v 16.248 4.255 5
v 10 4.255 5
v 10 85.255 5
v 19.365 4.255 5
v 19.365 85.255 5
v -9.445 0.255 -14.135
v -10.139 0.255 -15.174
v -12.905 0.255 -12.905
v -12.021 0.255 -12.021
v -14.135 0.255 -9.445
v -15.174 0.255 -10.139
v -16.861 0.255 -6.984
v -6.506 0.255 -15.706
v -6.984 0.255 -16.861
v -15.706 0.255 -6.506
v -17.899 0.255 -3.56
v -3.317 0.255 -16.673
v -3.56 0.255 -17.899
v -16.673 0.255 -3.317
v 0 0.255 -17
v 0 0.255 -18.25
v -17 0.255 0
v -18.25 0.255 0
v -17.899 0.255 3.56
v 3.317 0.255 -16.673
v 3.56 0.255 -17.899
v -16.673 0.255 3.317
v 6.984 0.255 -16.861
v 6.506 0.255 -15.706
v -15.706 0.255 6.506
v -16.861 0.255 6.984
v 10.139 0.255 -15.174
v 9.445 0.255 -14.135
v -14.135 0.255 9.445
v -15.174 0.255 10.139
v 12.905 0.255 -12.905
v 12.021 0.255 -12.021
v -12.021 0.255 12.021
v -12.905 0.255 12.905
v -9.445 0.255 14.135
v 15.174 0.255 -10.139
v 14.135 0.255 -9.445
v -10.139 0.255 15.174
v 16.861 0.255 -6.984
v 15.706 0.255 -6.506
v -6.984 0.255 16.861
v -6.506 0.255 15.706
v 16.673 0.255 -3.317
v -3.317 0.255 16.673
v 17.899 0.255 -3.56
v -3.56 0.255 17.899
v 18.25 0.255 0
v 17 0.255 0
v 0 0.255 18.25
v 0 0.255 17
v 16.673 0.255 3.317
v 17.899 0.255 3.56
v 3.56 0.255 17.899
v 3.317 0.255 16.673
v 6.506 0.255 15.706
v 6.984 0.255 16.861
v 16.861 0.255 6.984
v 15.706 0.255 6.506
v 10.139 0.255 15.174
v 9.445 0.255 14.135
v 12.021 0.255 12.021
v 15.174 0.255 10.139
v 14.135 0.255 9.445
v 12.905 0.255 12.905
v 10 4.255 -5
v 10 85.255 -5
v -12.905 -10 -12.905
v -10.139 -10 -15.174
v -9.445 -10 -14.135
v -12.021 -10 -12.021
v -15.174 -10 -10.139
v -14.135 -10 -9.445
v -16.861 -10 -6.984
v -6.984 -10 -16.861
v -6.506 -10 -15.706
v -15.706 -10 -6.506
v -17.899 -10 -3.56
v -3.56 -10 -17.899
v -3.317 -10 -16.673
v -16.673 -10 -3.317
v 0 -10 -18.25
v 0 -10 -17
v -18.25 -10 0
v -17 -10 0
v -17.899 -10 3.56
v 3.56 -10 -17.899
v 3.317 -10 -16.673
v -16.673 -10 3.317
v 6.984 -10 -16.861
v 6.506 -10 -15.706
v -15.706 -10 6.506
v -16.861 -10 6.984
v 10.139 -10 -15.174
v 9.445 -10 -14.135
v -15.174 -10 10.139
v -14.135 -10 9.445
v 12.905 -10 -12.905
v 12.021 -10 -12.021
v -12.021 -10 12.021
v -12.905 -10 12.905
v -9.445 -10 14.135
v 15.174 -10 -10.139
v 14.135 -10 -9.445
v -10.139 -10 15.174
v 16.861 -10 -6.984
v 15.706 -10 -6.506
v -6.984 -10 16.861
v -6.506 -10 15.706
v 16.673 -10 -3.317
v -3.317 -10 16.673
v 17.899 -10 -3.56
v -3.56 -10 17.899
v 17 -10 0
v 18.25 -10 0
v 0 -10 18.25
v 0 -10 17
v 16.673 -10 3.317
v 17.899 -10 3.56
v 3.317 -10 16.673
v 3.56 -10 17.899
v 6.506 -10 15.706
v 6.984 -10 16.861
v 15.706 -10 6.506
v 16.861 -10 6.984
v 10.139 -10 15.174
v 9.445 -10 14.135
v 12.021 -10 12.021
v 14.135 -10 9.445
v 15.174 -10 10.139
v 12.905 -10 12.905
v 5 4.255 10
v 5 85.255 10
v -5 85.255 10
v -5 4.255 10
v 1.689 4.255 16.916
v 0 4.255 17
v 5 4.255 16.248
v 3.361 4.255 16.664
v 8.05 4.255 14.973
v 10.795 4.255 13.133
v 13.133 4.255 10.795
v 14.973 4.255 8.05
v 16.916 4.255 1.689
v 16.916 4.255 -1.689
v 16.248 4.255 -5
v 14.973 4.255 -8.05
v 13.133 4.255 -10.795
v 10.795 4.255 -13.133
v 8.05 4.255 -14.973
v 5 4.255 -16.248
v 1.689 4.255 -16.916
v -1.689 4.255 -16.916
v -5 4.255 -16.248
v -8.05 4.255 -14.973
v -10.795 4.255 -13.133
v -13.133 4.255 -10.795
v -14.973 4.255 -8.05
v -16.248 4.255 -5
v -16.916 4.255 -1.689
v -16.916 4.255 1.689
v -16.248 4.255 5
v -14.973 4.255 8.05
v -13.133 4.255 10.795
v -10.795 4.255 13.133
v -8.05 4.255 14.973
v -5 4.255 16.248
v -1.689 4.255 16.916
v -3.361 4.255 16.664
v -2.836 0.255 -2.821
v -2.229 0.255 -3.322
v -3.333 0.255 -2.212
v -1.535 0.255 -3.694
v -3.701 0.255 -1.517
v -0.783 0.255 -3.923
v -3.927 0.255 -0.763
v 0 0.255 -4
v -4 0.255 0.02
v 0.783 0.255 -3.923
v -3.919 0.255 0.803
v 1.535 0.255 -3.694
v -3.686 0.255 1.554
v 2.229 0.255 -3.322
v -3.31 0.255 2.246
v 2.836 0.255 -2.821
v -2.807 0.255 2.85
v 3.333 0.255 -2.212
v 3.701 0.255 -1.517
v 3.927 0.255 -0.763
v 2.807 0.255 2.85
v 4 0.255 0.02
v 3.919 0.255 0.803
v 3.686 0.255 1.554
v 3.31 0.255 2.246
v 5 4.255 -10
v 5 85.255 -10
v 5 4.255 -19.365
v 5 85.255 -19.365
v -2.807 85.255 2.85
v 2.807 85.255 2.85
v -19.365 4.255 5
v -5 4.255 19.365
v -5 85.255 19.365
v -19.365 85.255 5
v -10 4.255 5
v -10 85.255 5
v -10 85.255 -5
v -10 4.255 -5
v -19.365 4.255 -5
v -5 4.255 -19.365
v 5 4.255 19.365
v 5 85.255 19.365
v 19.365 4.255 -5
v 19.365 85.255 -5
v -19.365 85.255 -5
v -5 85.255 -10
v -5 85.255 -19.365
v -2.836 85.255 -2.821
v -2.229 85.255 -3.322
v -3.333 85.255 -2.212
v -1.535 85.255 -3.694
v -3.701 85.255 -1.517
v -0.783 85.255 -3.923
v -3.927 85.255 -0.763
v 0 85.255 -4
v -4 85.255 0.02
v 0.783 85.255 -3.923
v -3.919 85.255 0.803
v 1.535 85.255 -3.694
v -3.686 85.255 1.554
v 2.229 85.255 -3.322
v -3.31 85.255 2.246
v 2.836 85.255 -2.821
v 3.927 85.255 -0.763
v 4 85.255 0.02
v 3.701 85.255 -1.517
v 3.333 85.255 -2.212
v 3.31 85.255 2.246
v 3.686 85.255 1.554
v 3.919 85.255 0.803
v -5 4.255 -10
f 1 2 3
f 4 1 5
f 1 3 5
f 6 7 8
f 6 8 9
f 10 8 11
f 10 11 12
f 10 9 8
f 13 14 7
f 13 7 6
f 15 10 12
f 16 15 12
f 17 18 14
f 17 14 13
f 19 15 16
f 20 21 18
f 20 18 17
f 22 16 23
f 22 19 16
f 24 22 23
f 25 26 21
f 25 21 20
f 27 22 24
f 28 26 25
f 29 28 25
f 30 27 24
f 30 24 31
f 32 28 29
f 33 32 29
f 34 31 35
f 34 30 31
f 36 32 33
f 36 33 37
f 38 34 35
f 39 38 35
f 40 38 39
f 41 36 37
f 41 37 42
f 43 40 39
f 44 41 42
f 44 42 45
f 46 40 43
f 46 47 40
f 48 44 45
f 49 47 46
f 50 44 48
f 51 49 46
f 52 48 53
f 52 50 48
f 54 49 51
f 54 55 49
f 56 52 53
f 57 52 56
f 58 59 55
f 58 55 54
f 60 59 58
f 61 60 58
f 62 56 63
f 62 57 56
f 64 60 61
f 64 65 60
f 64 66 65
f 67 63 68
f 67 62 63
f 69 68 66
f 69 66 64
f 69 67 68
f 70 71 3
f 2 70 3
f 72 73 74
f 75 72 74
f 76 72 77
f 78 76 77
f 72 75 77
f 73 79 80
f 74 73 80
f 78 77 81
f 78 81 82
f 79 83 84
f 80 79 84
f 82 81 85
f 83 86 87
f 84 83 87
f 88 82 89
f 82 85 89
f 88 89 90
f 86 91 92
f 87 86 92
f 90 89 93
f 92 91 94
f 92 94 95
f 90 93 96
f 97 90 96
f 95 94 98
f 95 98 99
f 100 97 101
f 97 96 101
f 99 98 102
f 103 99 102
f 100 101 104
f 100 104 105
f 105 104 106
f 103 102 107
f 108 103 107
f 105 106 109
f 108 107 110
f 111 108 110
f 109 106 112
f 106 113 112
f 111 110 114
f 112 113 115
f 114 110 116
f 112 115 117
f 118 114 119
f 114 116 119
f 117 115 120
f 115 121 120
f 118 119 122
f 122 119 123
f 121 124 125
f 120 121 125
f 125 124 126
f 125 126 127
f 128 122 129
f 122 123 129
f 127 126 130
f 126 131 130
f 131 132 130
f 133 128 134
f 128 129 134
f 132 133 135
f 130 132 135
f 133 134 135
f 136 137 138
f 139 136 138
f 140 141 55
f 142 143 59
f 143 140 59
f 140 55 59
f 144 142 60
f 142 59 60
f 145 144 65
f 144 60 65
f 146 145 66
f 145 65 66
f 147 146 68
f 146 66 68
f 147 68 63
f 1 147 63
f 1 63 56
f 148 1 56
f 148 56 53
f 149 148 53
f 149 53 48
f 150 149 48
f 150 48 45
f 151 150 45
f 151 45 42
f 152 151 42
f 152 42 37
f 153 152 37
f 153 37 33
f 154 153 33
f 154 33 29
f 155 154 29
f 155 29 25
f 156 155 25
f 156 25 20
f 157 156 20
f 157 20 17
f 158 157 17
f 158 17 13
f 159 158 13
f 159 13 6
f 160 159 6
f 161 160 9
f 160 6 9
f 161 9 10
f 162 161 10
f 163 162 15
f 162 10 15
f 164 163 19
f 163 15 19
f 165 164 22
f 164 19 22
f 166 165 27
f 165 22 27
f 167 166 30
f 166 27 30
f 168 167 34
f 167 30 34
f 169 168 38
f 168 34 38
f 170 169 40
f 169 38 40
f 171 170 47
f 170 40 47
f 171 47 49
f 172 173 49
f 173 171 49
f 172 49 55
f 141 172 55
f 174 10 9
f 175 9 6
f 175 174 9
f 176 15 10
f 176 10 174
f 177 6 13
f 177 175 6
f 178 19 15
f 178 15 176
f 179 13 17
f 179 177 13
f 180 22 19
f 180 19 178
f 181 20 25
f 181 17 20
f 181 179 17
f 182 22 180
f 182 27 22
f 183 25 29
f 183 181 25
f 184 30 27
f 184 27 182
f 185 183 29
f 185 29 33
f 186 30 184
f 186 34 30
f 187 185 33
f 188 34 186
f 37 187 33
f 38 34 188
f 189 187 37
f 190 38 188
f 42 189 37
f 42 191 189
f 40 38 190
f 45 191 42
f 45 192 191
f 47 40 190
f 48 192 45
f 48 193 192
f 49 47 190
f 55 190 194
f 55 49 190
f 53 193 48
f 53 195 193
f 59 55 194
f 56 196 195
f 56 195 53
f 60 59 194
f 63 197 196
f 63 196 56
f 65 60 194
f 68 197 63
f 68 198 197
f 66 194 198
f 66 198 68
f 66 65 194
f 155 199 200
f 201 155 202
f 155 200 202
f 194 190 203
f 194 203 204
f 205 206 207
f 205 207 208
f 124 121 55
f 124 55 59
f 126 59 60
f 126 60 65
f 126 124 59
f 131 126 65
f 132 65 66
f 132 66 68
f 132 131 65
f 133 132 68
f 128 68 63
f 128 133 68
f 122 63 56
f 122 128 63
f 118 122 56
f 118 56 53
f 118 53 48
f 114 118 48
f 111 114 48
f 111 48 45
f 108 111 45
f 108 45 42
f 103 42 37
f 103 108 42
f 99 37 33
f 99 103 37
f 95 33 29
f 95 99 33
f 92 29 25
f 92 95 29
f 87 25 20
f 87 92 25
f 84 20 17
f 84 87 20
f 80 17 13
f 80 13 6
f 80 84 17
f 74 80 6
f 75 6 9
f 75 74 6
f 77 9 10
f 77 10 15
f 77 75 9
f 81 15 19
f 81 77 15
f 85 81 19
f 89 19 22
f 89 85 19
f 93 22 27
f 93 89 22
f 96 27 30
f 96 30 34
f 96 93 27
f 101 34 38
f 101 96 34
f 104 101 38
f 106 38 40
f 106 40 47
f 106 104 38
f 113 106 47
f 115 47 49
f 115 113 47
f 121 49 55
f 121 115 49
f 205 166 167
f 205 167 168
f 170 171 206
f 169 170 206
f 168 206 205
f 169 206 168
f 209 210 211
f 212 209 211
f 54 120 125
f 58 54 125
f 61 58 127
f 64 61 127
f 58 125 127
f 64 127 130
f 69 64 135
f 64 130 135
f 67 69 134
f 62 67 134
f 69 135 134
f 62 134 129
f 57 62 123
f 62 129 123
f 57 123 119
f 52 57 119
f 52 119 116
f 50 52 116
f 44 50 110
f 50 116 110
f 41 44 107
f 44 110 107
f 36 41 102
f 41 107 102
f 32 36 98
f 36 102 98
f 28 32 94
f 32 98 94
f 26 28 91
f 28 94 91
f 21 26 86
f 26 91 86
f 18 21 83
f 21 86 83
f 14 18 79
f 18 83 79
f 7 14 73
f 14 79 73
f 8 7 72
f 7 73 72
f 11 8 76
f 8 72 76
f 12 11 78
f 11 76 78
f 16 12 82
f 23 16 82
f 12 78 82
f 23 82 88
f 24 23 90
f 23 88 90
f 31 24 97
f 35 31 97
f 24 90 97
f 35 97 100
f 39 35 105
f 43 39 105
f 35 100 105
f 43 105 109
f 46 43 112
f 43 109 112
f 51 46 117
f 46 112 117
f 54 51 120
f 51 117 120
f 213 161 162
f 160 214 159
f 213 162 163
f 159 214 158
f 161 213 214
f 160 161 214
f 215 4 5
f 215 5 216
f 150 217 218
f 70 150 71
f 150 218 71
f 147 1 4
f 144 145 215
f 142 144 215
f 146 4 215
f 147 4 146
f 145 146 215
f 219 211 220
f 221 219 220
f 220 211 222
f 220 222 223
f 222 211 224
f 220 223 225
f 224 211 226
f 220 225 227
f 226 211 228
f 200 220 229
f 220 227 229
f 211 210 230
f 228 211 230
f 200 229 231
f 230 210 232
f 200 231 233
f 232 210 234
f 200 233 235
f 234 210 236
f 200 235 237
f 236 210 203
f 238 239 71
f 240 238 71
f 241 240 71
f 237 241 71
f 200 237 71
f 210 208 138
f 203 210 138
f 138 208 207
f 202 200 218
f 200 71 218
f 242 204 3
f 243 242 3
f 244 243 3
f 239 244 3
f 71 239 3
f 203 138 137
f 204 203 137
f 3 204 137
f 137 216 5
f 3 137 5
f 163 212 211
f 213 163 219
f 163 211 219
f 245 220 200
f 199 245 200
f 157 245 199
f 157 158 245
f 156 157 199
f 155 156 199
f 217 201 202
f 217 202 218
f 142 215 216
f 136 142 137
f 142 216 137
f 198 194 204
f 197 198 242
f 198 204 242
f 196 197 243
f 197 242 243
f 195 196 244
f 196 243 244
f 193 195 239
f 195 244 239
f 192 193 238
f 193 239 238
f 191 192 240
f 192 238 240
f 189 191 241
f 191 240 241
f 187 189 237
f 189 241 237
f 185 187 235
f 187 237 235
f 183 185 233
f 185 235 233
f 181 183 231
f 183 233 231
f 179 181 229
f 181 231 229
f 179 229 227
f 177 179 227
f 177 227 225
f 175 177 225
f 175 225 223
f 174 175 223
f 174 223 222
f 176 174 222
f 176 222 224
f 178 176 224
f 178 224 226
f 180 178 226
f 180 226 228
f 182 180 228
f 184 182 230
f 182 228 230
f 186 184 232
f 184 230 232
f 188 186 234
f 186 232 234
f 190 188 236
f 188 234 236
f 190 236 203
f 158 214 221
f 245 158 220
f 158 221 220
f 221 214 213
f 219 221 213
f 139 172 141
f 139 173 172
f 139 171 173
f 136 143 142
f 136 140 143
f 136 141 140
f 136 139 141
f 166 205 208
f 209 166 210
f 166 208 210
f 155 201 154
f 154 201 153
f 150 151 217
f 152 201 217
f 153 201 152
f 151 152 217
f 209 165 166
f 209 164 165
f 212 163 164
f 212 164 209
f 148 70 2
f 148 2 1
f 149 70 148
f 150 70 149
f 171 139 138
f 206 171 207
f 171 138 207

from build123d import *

# Parameters (mm, degrees)
BOSS_EXTRUDE8_DEPTH           = 0.255
BOSS_EXTRUDE8_DEPTH_BACK      = 10
SKETCH13_R                    = 18.25
SKETCH13_R_2                  = 17
SKETCH14_R                    = 17
SKETCH14_R_2                  = 4
BOSS_EXTRUDE17_DEPTH          = 5
CONNECTOR_CYLINDER_DEPTH      = 80
CONNECTOR_CYLINDER_DEPTH_BACK = 1
SKETCH21_R                    = 20
SKETCH23_R                    = 4
CUT_EXTRUDE4_DEPTH            = 96.3
CONNECTOR_CYLINDER_CUT_DEPTH  = 81
CUT_EXTRUDE5_DEPTH            = 81
KEY_CUT_DEPTH                 = 85


with BuildPart() as part:
    # Sketch13 → Boss-Extrude8 (new, two sides: drawn at the far end of the back side and taken through both)
    with BuildSketch(Plane(origin=(0, 0, 0), x_dir=(1, 0, 0), z_dir=(0, 1, 0)).offset(-BOSS_EXTRUDE8_DEPTH_BACK)):
        with Locations(Location((0, 0, 0), (0, 0, 270))):
            Circle(SKETCH13_R)
        with Locations(Location((0, 0, 0), (0, 0, 270))):
            Circle(SKETCH13_R_2, mode=Mode.SUBTRACT)
    extrude(amount=BOSS_EXTRUDE8_DEPTH + BOSS_EXTRUDE8_DEPTH_BACK)


with BuildPart() as body_2:
    # Sketch14 → Boss-Extrude17 (new body)
    # profile 1 of 2: a face of its own
    with BuildSketch(Plane(origin=(0, 0.255, 0), x_dir=(1, 0, 0), z_dir=(0, 1, 0))):
        with Locations(Location((0, 0, 0), (0, 0, 270))):
            Circle(SKETCH14_R)
        Circle(SKETCH14_R_2, mode=Mode.SUBTRACT)
    # profile 2 of 2: a face of its own
    with BuildSketch(Plane(origin=(0, 0.255, 0), x_dir=(1, 0, 0), z_dir=(0, 1, 0))):
        with BuildLine():
            ThreePointArc((2.066246597, 3.425), (0, 4), (-2.066246597, 3.425))
            Line((-2.066246597, 3.425), (0, 3.425))
            Line((0, 3.425), (2.066246597, 3.425))
        make_face()
    extrude(amount=BOSS_EXTRUDE17_DEPTH)

    # Sketch21 → Connector Cylinder (add, two sides: drawn at the far end of the back side and taken through both)
    with BuildSketch(Plane(origin=(0, 5.255, 0), x_dir=(1, 0, 0), z_dir=(0, 1, 0)).offset(-CONNECTOR_CYLINDER_DEPTH_BACK)):
        with Locations(Location((0, 0, 0), (0, 0, 270))):
            Circle(SKETCH21_R)
    extrude(amount=CONNECTOR_CYLINDER_DEPTH + CONNECTOR_CYLINDER_DEPTH_BACK)

    # Sketch23 → Cut-Extrude4 (cut)
    with BuildSketch(Plane(origin=(0, 85.255, 0), x_dir=(1, 0, 0), z_dir=(0, 1, 0))):
        with Locations(Location((0, 0, 0), (0, 0, 270))):
            Circle(SKETCH23_R)
    extrude(amount=-CUT_EXTRUDE4_DEPTH, mode=Mode.SUBTRACT)

    # Sketch22 → Connector Cylinder Cut (cut)
    with BuildSketch(Plane(origin=(0, 85.255, 0), x_dir=(1, 0, 0), z_dir=(0, 1, 0))):
        with BuildLine():
            ThreePointArc((-5, -19.364916731), (0, -20), (5, -19.364916731))
            Line((5, -19.364916731), (5, -10))
            Line((5, -10), (-5, -10))
            Line((-5, -10), (-5, -19.364916731))
        make_face()
        with BuildLine():
            ThreePointArc((-19.364916731, 5), (-20, 0), (-19.364916731, -5))
            Line((-19.364916731, -5), (-10, -5))
            Line((-10, -5), (-10, 5))
            Line((-10, 5), (-19.364916731, 5))
        make_face()
        with BuildLine():
            Line((5, 10), (5, 19.364916731))
            ThreePointArc((5, 19.364916731), (0, 20), (-5, 19.364916731))
            Line((-5, 19.364916731), (-5, 10))
            Line((-5, 10), (5, 10))
        make_face()
        with BuildLine():
            Line((9.999996731, 5), (9.999996731, -5))
            Line((9.999996731, -5), (19.364916731, -5))
            ThreePointArc((19.364916731, -5), (19.840593925, -2.52008585), (20, 0))
            ThreePointArc((20, 0), (19.840593925, 2.52008585), (19.364916731, 5))
            Line((19.364916731, 5), (9.999996731, 5))
        make_face()
    extrude(amount=-CONNECTOR_CYLINDER_CUT_DEPTH, mode=Mode.SUBTRACT)

    # Sketch24 → Cut-Extrude5 (cut)
    with BuildSketch(Plane(origin=(0, 85.255, 0), x_dir=(1, 0, 0), z_dir=(0, 1, 0))):
        with BuildLine():
            Line((-5, 19.364916731), (-19.364916731, 5))
            ThreePointArc((-19.364916731, 5), (-14.142135624, 14.142135624), (-5, 19.364916731))
        make_face()
        with BuildLine():
            Line((5, 19.364916731), (19.364916731, 5))
            ThreePointArc((19.364916731, 5), (14.142135624, 14.142135624), (5, 19.364916731))
        make_face()
        with BuildLine():
            Line((19.364916731, -5), (5, -19.364916731))
            ThreePointArc((5, -19.364916731), (14.142135624, -14.142135624), (19.364916731, -5))
        make_face()
        with BuildLine():
            Line((-5, -19.364916731), (-19.364916731, -5))
            ThreePointArc((-19.364916731, -5), (-14.142135624, -14.142135624), (-5, -19.364916731))
        make_face()
    extrude(amount=-CUT_EXTRUDE5_DEPTH, mode=Mode.SUBTRACT)

    # Sketch25 → Key Cut (add)
    with BuildSketch(Plane.XZ.offset(-0.255)):
        with BuildLine():
            ThreePointArc((2.80668844, 2.85), (0, 4), (-2.80668844, 2.85))
            Line((-2.80668844, 2.85), (2.80668844, 2.85))
        make_face()
    extrude(amount=-KEY_CUT_DEPTH)


solid = Compound([part.part, body_2.part])
